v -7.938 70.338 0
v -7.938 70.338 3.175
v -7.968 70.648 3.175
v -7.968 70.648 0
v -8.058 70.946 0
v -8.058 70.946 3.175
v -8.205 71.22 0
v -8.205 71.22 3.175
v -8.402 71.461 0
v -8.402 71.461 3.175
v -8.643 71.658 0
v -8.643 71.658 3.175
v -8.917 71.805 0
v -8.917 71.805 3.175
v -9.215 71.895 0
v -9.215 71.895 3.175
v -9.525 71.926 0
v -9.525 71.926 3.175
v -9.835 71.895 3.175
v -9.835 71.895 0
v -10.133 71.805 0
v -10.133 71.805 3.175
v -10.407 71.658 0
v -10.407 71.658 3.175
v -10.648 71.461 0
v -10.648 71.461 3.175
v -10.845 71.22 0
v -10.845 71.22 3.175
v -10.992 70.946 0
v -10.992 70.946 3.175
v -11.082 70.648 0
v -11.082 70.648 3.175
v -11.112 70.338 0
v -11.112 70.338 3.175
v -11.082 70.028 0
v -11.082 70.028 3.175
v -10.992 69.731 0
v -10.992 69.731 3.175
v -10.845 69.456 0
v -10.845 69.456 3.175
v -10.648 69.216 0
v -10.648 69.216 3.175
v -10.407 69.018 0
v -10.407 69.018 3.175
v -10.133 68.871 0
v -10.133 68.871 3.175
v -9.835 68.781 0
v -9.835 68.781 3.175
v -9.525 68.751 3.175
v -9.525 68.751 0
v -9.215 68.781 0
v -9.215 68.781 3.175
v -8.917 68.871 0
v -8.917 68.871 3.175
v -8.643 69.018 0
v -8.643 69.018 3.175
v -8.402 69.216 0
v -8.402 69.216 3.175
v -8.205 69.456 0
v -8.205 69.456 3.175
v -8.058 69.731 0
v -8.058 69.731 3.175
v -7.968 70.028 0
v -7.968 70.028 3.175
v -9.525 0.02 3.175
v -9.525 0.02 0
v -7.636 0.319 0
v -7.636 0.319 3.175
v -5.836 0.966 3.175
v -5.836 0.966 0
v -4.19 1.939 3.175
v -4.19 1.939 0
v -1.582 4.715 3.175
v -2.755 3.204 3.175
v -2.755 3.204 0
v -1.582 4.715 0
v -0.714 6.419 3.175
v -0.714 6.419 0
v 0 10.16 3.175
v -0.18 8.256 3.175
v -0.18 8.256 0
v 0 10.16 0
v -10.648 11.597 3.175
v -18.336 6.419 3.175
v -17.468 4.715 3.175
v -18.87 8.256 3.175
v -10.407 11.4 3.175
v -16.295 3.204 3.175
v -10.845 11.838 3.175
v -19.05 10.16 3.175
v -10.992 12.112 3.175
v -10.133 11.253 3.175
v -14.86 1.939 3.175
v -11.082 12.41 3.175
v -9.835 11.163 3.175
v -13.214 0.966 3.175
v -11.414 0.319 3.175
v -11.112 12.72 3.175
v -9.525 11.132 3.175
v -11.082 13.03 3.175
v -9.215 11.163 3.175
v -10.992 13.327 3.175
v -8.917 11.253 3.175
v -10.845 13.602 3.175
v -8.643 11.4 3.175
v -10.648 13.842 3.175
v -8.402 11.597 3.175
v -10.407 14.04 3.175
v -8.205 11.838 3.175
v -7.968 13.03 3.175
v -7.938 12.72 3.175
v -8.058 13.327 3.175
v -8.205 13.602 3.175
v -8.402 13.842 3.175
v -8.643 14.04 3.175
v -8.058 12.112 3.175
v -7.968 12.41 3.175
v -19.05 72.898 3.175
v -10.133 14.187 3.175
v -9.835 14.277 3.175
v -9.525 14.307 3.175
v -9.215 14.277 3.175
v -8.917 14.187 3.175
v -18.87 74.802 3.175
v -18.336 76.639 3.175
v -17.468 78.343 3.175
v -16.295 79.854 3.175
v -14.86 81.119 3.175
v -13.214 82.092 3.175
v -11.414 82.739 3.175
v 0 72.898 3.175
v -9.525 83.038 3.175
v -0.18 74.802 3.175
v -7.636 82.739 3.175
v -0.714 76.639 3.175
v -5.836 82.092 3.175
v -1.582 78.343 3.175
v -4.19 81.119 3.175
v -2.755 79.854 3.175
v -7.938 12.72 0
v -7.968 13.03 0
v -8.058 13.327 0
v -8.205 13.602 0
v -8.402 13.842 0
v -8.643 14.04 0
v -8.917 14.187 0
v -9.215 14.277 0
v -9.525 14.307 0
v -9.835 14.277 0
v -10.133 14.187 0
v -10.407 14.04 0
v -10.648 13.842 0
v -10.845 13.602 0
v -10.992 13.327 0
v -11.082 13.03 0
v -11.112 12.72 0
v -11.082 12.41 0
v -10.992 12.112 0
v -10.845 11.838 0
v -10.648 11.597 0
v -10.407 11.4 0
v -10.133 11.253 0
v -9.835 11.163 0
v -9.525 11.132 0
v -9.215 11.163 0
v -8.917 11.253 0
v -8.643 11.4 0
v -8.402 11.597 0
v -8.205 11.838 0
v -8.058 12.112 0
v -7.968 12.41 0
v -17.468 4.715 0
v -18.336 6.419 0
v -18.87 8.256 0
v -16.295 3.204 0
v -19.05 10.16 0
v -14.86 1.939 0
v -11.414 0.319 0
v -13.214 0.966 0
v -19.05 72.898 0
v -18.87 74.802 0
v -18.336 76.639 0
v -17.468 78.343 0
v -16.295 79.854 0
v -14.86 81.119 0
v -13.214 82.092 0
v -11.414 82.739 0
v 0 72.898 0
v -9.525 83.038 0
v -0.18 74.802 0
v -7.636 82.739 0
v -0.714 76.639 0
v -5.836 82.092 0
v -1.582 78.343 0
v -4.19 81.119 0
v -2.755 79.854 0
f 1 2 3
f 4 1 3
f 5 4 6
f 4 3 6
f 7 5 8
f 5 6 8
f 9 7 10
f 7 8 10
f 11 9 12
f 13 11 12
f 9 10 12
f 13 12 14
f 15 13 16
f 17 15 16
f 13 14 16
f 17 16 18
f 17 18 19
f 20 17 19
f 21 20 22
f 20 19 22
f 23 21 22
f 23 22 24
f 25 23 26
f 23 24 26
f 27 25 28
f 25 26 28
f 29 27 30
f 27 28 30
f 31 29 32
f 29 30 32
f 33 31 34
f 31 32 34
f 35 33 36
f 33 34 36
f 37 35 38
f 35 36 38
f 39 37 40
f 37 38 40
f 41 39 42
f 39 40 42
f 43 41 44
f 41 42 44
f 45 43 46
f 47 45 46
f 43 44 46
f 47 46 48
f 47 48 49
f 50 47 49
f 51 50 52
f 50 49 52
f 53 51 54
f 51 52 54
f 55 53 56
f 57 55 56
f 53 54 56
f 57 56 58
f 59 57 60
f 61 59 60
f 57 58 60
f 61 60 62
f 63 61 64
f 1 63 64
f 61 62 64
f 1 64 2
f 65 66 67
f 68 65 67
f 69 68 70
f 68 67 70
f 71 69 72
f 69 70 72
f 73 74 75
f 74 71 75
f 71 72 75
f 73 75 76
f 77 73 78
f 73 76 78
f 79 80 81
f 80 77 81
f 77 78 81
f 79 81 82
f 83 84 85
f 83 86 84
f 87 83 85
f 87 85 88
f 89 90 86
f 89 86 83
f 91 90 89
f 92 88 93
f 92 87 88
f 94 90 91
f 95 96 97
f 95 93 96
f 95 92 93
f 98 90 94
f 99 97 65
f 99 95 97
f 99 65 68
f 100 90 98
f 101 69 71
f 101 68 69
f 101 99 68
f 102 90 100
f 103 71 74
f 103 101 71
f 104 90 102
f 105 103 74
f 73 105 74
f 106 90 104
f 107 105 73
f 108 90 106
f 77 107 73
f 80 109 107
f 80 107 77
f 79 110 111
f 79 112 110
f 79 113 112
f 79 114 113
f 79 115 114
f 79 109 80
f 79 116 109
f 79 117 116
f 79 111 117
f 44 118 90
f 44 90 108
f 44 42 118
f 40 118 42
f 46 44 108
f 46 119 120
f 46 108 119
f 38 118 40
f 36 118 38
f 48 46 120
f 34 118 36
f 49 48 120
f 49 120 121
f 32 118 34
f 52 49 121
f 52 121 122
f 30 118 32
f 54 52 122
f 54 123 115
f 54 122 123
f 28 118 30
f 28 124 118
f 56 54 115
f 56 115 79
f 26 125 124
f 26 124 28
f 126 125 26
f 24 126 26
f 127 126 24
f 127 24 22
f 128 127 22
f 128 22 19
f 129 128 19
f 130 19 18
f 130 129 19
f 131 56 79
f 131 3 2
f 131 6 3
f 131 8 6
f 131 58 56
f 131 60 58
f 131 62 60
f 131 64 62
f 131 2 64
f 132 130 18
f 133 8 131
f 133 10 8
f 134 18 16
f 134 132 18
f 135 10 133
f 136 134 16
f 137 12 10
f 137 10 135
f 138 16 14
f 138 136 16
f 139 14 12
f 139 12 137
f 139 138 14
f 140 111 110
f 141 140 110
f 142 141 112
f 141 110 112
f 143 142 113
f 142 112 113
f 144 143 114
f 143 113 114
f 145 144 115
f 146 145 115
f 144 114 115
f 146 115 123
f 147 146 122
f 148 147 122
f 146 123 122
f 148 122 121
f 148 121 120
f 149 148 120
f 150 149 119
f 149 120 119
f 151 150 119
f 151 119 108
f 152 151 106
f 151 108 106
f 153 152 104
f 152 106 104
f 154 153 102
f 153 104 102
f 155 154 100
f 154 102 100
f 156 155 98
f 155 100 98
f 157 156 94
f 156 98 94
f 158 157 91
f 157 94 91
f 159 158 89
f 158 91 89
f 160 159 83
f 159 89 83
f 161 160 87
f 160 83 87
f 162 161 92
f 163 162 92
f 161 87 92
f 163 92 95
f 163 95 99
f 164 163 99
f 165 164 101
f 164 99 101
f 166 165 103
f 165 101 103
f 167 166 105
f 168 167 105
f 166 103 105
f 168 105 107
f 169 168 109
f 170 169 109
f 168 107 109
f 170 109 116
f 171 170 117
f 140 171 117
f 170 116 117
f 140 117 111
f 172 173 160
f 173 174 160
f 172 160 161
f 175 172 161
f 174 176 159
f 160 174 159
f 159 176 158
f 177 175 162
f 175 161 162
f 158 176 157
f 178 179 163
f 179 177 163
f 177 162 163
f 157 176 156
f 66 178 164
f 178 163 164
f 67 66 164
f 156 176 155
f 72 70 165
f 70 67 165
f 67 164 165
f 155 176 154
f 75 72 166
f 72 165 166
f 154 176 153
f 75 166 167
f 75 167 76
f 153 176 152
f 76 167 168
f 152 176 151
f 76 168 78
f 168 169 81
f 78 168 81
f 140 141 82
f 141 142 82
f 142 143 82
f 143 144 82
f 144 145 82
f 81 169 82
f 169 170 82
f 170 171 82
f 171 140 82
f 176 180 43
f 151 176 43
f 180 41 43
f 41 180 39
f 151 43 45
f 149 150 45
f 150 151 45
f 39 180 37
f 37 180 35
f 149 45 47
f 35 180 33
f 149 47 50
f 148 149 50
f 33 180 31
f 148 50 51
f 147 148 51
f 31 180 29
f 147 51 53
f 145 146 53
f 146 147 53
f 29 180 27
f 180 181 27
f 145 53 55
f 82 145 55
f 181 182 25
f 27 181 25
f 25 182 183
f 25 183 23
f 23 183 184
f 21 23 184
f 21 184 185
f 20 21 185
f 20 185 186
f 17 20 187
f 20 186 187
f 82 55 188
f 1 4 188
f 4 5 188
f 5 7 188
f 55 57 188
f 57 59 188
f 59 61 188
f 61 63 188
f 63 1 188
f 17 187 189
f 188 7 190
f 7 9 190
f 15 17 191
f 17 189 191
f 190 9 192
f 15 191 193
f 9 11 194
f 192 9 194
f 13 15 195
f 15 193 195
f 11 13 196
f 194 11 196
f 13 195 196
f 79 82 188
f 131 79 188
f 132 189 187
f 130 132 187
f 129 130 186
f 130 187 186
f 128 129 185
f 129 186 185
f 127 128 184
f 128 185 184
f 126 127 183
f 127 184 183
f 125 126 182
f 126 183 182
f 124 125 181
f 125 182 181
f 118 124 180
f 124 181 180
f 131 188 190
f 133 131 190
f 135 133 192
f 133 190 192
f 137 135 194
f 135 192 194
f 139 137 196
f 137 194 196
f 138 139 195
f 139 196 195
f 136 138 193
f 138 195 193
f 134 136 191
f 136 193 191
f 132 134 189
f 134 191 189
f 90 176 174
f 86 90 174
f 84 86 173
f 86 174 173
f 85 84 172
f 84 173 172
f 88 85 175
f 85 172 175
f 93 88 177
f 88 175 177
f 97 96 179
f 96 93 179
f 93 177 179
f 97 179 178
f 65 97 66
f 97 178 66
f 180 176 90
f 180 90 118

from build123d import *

# Parameters (mm, degrees)
SKETCH2_W           = 19.05
SKETCH2_H           = 83.058
BOSS_EXTRUDE1_DEPTH = 3.175
FILLET1_R           = 10.16
SKETCH3_R           = 1.5875
CUT_EXTRUDE1_DEPTH  = 3.175


with BuildPart() as part:
    # Sketch2 → Boss-Extrude1 (new body)
    with BuildSketch(Plane.XY):
        with Locations((-9.525, 41.529)):
            Rectangle(SKETCH2_W, SKETCH2_H)
    extrude(amount=BOSS_EXTRUDE1_DEPTH)

    # Fillet1
    # the kernel refuses this fillet: 10.16 mm, written as the material it takes off along each edge
    with BuildSketch(Plane(origin=(-19.05, 0, -25.4), x_dir=(1, 0, 0), z_dir=(0, 0, 1)), Plane(origin=(-19.05, 83.058, -25.4), x_dir=(0, -1, 0), z_dir=(0, 0, 1)), Plane(origin=(0, 83.058, -25.4), x_dir=(-1, 0, 0), z_dir=(0, 0, 1))) as fillet1_piece_1:
        with BuildLine():
            CenterArc((FILLET1_R, FILLET1_R), FILLET1_R, 180, 90)
            Line((0, FILLET1_R), (0, 0))
            Line((0, 0), (FILLET1_R, 0))
        make_face()
    extrude(amount=53.975, mode=Mode.SUBTRACT)
    with BuildSketch(Plane(origin=(0, 0, -25.4), x_dir=(-1, 0, 0), z_dir=(0, 0, 1))) as fillet1_piece_2:
        with BuildLine():
            CenterArc((FILLET1_R, -FILLET1_R), FILLET1_R, 90, 90)
            Line((0, -FILLET1_R), (0, 0))
            Line((0, 0), (FILLET1_R, 0))
        make_face()
    extrude(amount=53.975, mode=Mode.SUBTRACT)

    # Sketch3 → Cut-Extrude1 (cut)
    with BuildSketch(Plane.XY.offset(3.175)):
        with Locations((-9.525, 12.719863167)):
            Circle(SKETCH3_R)
        with Locations((-9.525, 70.338136833)):
            Circle(SKETCH3_R)
    extrude(amount=-CUT_EXTRUDE1_DEPTH, mode=Mode.SUBTRACT)


solid = part.part
